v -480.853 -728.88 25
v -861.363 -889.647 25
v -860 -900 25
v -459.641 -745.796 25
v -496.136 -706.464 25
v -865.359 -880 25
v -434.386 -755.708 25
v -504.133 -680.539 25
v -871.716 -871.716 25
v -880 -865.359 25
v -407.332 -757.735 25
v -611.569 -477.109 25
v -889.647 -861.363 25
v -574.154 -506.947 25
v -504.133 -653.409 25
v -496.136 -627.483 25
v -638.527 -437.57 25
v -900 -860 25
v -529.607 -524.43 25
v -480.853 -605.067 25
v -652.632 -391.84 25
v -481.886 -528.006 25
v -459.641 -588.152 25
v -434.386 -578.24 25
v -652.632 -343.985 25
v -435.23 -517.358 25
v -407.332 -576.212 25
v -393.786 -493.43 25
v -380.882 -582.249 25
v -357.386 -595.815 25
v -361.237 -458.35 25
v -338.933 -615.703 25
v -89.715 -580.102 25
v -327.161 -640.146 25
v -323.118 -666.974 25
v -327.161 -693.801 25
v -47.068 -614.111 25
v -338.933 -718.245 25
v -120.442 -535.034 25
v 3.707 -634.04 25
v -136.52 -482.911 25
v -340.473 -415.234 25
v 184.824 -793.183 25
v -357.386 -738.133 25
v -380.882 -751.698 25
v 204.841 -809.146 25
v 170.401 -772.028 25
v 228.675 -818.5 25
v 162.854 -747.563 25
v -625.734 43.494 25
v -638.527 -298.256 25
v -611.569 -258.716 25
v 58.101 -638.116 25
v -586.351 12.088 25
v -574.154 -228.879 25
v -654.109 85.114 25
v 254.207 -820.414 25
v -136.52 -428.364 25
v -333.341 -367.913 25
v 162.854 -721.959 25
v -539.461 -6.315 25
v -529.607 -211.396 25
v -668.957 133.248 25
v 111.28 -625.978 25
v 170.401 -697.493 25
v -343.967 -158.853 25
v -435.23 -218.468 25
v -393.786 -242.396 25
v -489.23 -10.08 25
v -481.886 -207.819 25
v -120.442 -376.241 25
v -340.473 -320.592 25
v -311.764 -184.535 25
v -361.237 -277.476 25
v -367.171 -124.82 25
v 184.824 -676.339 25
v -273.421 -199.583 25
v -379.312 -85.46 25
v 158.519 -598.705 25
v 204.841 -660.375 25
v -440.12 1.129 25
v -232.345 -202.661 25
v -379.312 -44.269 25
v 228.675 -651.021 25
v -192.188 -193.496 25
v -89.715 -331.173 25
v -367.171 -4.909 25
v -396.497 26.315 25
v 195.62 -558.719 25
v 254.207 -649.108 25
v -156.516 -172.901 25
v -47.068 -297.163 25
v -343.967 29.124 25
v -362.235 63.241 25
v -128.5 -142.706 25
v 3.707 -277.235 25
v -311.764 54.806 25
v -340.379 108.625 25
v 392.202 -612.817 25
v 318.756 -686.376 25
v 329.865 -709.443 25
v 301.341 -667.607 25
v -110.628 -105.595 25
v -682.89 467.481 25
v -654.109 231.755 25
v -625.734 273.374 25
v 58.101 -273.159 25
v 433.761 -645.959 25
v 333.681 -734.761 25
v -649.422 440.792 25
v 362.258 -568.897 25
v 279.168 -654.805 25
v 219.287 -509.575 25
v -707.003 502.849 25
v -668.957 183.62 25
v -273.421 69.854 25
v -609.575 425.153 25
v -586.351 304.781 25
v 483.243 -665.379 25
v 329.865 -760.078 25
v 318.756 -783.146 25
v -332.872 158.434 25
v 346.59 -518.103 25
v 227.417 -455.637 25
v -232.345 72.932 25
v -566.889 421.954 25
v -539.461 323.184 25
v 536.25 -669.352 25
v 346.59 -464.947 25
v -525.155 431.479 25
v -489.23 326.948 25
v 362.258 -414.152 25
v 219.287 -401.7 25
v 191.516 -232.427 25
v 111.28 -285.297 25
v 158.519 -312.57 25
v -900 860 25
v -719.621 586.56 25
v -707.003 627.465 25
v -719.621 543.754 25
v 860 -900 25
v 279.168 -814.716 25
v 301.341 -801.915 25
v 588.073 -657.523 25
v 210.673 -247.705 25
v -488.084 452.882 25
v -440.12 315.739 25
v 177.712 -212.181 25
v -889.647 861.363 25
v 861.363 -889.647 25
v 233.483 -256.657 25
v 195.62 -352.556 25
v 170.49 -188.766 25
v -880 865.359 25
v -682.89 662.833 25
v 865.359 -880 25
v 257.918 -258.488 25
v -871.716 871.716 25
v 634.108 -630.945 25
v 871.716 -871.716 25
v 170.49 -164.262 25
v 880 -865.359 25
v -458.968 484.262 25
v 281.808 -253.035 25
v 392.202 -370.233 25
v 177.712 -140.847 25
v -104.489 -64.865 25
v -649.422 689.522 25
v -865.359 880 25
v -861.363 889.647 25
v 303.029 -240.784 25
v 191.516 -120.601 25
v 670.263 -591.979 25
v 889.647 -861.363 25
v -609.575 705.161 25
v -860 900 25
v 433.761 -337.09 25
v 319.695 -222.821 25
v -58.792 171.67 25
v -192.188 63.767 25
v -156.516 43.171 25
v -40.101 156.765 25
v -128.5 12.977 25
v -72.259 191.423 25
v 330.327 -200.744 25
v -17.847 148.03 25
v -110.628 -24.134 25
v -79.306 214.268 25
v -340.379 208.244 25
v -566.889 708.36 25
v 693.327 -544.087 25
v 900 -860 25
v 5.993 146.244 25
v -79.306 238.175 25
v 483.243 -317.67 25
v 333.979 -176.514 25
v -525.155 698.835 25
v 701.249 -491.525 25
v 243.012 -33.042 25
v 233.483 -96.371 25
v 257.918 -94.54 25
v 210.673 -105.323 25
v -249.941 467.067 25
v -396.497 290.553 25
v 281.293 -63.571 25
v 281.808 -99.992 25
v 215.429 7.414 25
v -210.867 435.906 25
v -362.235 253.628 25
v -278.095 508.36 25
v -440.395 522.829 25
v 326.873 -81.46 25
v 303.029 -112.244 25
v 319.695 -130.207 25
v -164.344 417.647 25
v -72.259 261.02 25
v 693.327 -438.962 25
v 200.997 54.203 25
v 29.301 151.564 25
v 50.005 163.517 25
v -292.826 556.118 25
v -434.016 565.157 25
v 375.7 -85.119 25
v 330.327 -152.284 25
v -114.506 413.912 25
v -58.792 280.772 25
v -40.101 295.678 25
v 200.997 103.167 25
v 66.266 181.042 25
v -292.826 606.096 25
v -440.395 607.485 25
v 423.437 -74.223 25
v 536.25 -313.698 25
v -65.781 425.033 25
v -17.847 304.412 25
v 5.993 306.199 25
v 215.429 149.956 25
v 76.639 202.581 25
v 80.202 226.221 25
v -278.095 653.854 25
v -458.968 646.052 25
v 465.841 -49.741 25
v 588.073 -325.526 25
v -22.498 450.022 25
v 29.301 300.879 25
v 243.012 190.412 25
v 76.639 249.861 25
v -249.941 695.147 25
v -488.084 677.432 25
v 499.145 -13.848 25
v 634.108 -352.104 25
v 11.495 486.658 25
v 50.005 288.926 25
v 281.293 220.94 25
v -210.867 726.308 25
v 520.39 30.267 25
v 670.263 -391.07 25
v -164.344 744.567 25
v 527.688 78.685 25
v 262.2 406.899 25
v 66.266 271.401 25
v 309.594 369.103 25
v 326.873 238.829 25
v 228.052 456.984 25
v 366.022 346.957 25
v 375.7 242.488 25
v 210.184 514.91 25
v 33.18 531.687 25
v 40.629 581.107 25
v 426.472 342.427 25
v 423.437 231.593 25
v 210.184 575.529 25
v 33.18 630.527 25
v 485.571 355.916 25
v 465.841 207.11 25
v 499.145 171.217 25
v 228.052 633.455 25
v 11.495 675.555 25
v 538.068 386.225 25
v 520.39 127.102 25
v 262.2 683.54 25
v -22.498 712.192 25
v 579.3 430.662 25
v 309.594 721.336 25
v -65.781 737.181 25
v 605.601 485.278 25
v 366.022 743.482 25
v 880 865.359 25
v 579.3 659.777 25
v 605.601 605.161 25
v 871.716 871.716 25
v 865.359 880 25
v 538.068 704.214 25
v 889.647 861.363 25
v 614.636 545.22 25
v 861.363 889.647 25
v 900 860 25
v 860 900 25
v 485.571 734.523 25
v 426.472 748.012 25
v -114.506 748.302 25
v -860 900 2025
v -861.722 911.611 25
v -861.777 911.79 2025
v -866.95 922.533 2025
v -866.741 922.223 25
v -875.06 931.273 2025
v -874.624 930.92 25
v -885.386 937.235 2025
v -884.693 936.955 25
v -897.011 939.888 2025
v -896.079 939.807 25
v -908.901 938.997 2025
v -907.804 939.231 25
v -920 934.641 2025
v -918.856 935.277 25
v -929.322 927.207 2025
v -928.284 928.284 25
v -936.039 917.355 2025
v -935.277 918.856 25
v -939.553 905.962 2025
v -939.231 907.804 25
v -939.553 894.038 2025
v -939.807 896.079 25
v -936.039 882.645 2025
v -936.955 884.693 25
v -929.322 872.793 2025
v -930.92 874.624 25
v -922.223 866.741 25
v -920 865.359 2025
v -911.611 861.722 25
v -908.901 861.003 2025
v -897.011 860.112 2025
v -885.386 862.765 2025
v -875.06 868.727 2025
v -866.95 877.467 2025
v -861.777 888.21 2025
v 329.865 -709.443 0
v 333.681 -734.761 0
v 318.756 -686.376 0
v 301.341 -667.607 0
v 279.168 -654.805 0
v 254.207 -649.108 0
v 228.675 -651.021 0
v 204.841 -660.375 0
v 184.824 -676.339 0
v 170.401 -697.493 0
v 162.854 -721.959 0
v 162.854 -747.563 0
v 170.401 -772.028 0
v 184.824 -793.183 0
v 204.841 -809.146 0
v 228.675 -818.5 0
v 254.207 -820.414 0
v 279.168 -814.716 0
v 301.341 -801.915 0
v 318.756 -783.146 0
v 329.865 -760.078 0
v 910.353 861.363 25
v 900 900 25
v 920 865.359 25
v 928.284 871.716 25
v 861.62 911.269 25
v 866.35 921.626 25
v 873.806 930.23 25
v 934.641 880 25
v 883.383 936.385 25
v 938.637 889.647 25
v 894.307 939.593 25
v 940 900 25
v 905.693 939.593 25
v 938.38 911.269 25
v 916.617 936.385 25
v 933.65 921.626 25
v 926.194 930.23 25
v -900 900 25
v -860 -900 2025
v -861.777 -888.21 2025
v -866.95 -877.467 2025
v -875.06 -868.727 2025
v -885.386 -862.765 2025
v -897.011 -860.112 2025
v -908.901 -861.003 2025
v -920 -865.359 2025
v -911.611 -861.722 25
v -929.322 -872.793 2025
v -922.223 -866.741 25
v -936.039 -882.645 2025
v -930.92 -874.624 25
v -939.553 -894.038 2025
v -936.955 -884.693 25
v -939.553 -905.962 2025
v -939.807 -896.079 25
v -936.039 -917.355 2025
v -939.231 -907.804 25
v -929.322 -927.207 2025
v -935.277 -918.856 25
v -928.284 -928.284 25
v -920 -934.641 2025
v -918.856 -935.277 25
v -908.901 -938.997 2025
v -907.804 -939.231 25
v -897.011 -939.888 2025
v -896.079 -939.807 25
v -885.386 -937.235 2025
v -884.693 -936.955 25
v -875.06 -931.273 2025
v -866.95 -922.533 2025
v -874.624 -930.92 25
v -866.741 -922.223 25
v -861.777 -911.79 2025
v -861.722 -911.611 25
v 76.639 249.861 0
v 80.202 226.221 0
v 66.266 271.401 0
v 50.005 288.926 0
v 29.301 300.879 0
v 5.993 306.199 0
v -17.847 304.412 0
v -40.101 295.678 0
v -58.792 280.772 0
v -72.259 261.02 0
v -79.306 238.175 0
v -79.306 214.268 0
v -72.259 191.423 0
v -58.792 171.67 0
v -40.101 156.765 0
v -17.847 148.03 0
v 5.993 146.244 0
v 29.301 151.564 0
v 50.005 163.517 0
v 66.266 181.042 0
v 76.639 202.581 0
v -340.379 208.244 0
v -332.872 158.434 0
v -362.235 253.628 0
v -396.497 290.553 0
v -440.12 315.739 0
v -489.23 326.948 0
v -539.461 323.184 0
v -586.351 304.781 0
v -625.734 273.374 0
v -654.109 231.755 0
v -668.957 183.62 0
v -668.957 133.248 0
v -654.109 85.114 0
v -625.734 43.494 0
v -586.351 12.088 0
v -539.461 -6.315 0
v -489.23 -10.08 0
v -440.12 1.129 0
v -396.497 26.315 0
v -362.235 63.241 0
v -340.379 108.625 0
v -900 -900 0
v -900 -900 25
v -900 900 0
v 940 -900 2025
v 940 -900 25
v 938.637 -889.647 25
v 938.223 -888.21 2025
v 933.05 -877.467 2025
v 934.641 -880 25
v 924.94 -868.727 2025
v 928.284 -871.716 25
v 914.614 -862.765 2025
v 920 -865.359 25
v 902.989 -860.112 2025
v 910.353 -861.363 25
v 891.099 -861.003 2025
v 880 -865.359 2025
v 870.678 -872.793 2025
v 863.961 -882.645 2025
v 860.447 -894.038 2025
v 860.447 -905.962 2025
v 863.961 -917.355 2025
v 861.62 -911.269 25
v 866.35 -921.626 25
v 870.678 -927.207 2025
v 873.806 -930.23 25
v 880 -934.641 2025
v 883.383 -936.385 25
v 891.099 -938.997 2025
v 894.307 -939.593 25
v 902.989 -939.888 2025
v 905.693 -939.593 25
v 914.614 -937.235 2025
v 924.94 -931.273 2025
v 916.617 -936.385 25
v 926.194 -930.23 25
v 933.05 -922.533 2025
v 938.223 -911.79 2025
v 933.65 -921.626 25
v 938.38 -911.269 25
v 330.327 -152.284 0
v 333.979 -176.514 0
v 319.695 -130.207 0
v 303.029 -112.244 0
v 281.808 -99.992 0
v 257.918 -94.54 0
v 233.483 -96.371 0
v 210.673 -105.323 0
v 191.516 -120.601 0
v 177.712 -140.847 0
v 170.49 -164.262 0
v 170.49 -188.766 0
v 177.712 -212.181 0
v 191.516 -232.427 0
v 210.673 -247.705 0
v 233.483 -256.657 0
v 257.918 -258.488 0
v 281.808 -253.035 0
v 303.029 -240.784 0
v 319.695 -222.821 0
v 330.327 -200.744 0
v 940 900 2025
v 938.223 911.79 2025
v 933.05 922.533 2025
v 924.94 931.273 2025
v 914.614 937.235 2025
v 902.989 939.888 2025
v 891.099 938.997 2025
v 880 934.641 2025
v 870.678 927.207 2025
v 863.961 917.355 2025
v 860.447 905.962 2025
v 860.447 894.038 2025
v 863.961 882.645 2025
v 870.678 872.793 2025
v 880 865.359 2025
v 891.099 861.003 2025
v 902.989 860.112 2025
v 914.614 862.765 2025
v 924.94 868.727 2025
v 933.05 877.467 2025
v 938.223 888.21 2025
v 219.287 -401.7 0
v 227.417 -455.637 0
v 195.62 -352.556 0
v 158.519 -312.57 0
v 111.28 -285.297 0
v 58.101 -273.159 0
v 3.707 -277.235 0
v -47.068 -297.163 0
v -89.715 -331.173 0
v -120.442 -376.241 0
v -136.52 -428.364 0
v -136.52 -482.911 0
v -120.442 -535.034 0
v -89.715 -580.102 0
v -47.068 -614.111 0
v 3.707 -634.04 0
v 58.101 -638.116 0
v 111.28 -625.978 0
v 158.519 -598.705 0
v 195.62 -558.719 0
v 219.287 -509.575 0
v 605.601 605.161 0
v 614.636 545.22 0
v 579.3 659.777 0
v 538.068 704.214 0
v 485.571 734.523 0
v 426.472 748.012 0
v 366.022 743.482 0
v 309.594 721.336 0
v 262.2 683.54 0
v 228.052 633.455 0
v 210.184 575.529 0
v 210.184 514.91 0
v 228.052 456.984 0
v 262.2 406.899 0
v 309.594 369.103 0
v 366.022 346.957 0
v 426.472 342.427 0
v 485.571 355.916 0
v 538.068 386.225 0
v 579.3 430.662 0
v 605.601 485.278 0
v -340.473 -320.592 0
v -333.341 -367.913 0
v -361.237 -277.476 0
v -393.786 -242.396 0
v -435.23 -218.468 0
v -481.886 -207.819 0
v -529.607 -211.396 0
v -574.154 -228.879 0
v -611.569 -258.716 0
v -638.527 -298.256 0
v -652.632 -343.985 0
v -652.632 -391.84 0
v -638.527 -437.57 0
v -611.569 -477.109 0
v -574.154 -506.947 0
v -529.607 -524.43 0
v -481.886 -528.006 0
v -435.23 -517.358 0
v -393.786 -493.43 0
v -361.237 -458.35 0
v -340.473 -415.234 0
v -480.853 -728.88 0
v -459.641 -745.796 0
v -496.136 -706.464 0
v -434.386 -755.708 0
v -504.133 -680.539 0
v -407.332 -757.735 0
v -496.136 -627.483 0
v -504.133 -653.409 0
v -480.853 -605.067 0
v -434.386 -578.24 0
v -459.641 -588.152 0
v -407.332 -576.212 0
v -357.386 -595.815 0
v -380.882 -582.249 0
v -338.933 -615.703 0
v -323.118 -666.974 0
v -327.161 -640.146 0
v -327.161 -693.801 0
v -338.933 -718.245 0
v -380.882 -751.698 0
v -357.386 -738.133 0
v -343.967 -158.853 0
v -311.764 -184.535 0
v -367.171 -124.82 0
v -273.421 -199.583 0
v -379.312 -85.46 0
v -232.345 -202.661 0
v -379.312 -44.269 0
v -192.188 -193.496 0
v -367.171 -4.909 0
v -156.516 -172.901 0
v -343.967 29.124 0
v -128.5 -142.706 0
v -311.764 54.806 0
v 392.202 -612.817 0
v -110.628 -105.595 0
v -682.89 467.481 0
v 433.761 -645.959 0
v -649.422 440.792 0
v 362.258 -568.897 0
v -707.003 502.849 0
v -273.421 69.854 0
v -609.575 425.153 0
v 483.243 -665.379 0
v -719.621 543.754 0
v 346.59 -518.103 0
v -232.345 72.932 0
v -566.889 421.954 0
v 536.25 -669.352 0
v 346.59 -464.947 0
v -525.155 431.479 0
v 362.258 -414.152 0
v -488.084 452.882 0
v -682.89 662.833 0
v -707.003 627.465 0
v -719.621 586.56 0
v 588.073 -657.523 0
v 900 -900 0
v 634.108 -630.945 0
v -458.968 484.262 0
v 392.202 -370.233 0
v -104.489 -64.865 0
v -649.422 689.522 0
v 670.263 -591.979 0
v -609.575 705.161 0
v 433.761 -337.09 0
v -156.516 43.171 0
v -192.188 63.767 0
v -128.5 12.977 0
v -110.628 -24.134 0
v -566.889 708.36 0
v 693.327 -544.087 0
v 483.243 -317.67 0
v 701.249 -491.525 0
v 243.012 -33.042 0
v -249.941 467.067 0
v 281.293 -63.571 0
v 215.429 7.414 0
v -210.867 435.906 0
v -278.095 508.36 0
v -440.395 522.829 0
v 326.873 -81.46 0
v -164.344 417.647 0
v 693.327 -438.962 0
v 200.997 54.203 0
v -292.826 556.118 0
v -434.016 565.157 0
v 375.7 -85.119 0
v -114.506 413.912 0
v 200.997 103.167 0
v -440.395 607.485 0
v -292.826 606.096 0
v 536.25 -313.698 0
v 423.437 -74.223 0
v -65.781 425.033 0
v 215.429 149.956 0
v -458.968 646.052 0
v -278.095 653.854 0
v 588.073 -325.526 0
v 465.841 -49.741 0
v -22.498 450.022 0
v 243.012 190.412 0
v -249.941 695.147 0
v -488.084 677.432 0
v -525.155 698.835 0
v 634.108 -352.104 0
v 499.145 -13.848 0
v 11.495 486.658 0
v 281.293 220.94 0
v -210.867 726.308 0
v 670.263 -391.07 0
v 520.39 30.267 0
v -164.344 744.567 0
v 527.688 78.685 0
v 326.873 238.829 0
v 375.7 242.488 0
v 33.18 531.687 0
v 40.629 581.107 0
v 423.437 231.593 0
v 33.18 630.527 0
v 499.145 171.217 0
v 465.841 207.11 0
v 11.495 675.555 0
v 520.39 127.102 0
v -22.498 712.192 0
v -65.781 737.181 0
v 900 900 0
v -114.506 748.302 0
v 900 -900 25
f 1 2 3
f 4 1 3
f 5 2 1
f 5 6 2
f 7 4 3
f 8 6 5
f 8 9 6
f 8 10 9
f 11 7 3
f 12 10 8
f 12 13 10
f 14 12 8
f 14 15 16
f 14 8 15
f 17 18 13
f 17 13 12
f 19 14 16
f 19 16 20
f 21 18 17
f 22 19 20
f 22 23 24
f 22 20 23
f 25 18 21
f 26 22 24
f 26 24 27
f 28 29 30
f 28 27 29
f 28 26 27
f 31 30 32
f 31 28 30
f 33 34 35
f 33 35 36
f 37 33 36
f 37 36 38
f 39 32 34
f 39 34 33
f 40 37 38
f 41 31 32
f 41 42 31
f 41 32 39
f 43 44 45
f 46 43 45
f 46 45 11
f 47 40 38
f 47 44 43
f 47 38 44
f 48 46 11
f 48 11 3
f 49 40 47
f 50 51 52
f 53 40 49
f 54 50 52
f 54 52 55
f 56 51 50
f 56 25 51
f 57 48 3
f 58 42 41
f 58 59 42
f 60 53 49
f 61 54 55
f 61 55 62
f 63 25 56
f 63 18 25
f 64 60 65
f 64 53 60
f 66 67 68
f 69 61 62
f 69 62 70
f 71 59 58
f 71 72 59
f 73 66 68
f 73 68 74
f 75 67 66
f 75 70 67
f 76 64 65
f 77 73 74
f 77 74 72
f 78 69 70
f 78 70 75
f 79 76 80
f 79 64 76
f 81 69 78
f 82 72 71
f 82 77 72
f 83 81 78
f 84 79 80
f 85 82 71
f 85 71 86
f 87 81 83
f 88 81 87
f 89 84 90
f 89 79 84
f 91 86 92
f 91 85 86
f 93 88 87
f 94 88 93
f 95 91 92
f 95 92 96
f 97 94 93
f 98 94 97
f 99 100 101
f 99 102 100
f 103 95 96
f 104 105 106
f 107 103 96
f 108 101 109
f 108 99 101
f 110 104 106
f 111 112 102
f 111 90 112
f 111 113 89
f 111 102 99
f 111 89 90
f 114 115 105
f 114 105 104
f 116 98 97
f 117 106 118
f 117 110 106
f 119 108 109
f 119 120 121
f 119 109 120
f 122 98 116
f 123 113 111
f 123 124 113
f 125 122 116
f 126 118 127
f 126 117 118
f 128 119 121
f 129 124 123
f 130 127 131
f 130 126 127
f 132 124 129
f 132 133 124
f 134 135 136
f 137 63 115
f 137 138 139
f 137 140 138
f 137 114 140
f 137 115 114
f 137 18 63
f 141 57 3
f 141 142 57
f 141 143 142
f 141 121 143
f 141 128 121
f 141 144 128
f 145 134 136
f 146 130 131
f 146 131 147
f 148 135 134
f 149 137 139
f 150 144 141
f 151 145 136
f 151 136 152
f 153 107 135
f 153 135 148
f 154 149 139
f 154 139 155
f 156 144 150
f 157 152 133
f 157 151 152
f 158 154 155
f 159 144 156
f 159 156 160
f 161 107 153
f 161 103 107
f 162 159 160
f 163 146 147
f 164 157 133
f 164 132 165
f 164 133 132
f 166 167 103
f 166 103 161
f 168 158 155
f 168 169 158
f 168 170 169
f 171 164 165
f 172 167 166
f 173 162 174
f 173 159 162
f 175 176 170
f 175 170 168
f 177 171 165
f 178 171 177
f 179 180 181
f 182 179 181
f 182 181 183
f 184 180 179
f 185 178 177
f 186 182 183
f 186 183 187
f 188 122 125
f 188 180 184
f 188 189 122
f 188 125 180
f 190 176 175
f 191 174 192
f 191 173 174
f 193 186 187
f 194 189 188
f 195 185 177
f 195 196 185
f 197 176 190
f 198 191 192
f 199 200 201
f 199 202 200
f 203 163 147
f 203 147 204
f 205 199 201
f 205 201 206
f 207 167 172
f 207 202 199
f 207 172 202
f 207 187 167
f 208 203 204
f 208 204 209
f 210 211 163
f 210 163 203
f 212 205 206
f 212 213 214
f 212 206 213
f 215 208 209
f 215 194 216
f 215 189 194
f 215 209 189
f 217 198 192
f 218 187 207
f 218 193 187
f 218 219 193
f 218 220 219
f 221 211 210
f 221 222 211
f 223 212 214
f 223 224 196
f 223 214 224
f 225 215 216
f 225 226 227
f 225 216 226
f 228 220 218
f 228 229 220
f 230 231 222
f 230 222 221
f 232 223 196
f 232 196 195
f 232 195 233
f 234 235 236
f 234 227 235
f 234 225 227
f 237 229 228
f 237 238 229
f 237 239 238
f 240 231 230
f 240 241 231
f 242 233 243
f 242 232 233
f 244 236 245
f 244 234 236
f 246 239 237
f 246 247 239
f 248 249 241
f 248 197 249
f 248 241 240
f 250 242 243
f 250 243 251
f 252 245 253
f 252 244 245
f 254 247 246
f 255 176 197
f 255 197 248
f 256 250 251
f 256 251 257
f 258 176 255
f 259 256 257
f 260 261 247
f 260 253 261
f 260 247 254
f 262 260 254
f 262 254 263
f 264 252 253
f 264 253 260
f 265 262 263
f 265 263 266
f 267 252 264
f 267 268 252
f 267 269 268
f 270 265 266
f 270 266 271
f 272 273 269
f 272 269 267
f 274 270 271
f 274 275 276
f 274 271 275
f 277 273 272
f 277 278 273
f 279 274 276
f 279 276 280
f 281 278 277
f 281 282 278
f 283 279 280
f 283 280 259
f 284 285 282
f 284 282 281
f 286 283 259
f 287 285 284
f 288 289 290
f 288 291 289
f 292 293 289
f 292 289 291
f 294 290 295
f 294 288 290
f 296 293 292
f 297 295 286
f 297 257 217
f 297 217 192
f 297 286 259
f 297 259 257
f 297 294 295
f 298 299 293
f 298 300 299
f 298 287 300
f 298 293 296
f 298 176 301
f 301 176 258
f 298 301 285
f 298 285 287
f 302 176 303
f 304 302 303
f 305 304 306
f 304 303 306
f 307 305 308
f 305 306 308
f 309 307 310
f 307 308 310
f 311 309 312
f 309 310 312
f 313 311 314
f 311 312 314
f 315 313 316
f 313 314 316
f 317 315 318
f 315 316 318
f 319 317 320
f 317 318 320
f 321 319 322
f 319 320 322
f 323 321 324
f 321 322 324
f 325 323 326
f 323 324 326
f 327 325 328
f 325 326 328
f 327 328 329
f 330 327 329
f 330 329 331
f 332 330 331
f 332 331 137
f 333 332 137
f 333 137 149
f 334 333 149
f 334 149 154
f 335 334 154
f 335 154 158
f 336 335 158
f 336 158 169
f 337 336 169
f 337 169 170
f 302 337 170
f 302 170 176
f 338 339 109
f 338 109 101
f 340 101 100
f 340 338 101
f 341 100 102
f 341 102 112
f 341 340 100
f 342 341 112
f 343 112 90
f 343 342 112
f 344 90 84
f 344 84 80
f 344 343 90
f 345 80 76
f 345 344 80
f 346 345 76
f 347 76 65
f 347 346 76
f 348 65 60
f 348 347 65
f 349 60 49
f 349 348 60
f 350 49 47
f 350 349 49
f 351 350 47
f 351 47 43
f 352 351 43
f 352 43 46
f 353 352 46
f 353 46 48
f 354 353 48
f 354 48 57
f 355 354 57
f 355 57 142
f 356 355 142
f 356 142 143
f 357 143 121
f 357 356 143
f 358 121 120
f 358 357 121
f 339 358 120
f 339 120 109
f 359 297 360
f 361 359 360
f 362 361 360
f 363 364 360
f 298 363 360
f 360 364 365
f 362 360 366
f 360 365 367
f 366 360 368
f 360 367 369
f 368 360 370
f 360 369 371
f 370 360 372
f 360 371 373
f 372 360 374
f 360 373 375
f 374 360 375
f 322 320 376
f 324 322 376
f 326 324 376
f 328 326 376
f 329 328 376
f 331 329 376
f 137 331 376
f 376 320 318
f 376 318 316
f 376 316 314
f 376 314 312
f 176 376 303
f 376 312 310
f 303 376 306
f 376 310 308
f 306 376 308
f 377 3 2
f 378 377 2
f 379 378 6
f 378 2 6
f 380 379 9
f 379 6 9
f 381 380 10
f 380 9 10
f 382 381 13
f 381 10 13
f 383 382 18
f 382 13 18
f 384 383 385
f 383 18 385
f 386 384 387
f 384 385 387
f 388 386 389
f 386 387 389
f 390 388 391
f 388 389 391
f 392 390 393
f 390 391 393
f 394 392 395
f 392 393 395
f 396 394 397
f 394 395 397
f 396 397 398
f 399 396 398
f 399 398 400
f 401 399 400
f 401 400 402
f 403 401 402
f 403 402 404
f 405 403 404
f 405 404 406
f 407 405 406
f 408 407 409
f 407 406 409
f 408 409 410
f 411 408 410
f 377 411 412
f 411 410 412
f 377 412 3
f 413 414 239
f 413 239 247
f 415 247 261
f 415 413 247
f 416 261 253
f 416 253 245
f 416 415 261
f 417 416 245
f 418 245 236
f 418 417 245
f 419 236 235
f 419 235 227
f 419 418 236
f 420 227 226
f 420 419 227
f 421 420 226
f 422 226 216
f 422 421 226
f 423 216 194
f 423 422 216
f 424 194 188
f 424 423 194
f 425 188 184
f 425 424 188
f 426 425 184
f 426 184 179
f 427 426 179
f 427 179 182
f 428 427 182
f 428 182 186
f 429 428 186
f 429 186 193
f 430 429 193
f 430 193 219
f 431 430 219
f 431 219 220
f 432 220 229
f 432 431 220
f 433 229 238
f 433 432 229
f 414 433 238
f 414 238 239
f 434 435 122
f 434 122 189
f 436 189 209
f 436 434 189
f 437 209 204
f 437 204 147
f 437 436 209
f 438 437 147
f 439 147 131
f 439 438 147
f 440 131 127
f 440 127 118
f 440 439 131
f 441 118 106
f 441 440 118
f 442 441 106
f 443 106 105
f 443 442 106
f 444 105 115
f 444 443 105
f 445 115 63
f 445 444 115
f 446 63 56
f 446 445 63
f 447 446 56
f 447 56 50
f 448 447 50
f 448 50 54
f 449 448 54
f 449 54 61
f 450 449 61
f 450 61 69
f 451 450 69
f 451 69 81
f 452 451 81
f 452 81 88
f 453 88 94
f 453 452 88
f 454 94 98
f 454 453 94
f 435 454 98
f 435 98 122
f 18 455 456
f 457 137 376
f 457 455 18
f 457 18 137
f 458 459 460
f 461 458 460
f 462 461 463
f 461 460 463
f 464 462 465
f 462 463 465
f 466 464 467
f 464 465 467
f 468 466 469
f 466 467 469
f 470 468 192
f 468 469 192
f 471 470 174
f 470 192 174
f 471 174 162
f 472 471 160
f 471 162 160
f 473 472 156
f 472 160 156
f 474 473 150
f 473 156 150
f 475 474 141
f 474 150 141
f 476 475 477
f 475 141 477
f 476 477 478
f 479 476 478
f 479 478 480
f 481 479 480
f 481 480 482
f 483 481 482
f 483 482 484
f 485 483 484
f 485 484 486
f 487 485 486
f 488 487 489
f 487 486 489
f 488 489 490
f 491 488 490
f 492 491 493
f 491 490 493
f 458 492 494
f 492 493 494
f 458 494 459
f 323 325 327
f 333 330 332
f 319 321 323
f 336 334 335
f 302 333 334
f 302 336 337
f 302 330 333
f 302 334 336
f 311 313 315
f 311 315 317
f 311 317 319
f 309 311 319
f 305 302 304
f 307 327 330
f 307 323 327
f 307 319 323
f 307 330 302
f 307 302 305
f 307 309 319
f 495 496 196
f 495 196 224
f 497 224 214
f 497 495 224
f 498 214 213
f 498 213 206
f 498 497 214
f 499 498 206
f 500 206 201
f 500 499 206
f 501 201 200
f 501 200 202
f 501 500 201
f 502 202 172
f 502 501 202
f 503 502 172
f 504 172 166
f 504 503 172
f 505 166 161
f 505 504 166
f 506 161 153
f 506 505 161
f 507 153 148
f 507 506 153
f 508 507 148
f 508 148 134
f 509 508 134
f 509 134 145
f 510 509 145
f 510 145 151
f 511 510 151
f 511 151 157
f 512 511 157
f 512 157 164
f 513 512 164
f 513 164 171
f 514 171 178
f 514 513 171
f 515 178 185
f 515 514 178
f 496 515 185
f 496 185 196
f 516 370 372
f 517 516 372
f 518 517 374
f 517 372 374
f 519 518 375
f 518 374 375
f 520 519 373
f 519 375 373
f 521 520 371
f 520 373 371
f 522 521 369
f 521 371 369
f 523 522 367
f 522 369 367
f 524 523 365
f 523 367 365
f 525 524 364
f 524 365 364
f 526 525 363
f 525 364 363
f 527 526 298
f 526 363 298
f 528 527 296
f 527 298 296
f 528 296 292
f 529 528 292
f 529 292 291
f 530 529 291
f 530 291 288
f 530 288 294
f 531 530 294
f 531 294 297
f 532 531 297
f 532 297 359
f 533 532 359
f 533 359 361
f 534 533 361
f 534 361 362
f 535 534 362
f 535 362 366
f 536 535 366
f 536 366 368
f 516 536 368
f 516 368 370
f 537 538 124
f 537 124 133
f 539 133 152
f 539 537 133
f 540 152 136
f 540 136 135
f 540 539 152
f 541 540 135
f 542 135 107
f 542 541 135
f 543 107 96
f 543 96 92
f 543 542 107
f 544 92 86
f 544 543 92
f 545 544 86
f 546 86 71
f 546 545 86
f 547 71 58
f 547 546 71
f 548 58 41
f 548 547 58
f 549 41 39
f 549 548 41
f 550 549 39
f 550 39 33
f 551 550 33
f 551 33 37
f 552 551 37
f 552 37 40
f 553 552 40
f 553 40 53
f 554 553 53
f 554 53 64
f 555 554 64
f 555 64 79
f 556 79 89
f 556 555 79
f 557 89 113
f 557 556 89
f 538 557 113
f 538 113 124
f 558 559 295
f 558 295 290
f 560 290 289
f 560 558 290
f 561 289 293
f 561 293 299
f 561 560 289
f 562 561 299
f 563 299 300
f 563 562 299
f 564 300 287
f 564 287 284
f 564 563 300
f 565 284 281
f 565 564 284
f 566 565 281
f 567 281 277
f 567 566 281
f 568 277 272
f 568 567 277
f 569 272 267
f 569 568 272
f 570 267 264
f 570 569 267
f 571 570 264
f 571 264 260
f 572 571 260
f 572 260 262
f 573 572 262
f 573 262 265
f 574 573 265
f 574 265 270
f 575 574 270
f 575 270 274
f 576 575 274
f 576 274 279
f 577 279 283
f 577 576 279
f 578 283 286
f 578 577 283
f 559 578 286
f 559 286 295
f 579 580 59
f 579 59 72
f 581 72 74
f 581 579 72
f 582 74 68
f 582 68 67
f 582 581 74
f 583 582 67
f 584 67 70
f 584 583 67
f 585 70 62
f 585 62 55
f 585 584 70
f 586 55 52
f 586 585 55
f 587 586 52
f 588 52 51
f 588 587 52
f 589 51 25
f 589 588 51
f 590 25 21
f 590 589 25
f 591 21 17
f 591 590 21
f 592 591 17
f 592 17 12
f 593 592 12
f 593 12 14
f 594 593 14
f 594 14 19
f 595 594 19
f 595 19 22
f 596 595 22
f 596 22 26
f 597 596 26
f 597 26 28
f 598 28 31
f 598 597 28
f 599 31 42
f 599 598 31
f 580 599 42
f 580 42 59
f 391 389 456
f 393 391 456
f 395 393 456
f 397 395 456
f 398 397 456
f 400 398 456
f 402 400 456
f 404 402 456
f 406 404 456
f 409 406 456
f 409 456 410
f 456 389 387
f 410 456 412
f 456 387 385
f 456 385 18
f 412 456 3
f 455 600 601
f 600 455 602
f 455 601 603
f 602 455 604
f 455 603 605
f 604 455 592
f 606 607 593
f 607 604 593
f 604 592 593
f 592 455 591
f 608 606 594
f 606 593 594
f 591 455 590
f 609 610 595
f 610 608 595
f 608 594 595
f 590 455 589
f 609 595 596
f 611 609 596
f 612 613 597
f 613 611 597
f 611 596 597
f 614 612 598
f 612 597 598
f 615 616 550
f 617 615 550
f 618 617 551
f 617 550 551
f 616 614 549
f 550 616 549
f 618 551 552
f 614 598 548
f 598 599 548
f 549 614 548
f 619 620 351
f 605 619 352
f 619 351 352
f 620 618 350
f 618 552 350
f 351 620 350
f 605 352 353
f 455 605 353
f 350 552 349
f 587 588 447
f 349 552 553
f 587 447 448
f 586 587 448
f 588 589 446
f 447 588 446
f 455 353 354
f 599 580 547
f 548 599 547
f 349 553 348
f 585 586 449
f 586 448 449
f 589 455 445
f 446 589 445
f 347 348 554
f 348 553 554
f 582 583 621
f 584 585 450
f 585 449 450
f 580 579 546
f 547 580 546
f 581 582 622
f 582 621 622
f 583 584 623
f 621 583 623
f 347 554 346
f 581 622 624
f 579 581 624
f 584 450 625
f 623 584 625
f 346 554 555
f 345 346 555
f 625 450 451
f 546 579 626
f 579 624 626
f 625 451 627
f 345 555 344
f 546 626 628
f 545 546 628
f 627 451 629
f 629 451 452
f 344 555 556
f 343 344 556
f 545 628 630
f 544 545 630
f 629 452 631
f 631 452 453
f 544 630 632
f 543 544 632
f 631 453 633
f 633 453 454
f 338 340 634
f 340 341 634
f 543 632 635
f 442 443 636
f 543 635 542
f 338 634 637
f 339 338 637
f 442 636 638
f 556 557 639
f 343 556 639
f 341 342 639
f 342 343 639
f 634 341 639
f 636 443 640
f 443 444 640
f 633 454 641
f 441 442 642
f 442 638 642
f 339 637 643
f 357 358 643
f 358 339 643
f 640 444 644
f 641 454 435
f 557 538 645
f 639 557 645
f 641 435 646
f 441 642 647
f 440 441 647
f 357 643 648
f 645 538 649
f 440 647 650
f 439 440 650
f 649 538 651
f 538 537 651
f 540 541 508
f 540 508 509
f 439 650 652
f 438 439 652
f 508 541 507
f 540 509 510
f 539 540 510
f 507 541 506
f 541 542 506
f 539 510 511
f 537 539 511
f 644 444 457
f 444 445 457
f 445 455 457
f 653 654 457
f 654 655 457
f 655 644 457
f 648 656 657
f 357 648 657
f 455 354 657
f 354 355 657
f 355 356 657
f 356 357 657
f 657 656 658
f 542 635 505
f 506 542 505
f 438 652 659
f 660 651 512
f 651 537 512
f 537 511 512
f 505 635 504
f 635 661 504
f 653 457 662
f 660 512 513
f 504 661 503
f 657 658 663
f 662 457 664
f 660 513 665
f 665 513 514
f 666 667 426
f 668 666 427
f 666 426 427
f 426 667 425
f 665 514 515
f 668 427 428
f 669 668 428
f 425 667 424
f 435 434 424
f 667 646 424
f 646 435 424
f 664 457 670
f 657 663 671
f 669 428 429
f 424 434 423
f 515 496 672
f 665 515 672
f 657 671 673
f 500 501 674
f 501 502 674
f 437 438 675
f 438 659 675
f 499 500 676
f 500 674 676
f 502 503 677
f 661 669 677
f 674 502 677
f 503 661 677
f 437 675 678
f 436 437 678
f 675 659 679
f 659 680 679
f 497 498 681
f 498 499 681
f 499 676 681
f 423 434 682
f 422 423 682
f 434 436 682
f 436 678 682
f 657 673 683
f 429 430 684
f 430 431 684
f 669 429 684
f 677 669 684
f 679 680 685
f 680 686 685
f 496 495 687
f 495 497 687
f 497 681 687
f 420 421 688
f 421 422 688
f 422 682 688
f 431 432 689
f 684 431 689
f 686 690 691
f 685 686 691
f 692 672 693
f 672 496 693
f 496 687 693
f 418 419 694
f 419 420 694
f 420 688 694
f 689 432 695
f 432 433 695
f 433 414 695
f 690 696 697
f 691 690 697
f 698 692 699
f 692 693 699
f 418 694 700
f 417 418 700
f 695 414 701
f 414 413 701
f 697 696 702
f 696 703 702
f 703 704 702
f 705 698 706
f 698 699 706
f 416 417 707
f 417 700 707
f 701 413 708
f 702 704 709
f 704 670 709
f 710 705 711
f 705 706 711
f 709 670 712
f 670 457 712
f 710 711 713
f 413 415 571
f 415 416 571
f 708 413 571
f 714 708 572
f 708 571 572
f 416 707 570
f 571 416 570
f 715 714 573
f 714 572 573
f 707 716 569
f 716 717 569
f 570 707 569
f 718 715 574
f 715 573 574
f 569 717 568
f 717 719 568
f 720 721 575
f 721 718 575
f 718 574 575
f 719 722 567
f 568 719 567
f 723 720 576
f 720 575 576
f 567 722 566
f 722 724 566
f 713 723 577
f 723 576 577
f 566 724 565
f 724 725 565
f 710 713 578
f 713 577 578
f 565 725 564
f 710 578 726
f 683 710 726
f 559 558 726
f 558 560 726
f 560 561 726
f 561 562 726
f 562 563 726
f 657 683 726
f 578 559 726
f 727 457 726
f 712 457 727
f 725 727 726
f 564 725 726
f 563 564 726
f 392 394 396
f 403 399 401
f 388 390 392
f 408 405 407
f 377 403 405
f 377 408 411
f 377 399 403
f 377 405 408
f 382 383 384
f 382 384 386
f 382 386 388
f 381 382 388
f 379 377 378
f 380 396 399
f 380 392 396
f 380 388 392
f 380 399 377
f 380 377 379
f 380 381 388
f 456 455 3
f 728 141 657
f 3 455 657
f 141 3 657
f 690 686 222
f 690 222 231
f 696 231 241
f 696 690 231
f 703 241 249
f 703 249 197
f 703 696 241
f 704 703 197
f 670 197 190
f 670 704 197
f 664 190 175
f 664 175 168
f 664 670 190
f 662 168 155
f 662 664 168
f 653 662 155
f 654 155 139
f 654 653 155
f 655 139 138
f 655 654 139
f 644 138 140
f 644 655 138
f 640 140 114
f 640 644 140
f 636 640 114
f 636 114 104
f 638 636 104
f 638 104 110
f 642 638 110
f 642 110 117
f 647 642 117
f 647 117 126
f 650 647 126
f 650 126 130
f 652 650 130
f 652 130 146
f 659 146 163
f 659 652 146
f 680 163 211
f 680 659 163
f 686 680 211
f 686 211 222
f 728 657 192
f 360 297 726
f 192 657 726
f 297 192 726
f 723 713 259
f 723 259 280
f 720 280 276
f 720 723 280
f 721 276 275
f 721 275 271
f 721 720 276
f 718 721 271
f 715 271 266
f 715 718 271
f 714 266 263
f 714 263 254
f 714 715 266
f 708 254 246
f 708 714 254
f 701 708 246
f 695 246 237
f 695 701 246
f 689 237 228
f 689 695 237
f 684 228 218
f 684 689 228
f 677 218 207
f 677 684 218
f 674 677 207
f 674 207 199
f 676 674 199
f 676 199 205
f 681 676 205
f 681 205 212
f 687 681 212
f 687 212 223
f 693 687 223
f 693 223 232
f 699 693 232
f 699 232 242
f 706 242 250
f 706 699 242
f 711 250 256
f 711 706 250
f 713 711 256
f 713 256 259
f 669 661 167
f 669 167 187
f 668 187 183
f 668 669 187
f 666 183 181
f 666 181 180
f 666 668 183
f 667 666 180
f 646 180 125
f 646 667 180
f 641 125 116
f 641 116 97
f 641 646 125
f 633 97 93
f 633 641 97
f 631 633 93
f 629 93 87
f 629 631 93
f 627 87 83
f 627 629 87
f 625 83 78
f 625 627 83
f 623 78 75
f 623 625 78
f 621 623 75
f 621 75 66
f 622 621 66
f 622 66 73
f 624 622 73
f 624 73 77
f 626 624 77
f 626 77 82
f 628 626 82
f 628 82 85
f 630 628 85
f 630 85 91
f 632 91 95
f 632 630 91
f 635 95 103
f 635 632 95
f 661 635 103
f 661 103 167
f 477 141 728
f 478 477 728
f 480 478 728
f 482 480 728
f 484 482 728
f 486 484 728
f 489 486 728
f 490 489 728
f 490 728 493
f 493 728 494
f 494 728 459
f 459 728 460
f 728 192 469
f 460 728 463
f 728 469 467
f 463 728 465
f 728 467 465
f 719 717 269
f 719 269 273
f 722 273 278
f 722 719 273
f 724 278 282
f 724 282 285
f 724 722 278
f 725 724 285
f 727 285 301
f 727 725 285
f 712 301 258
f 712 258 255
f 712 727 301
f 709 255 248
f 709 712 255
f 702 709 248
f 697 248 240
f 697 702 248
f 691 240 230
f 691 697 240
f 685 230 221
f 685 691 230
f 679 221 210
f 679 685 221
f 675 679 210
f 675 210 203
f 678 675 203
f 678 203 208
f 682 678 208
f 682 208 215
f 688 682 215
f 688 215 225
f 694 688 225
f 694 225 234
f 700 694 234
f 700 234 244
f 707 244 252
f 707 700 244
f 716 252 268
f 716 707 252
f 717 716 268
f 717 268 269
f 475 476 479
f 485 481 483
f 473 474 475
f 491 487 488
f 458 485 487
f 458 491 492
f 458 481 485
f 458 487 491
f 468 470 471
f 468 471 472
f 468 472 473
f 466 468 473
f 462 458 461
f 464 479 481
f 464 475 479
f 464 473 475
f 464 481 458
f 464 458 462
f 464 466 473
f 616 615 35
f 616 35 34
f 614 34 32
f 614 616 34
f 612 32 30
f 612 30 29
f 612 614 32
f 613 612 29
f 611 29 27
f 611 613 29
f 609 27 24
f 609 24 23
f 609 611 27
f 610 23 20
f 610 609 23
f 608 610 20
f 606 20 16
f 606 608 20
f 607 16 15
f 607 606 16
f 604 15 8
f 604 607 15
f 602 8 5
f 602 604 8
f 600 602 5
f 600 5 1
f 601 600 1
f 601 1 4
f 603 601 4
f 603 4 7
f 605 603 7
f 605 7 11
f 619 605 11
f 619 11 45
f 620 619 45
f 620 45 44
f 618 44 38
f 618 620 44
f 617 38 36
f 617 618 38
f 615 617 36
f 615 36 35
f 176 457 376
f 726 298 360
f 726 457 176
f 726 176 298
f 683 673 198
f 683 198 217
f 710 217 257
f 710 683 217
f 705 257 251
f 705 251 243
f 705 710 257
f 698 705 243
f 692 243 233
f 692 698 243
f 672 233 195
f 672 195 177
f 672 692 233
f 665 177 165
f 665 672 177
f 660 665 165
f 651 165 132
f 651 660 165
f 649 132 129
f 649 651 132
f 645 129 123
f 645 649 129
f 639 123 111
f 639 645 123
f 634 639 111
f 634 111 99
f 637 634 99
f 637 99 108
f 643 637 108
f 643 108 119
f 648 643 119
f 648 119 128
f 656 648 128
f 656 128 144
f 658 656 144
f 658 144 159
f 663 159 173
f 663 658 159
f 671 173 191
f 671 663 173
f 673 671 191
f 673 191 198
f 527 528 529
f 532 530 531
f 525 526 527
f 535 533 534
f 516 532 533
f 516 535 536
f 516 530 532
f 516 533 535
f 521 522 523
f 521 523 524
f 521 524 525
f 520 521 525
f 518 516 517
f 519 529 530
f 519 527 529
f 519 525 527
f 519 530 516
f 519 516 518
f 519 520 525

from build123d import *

# Parameters (mm, degrees)
F0_W     = 1800
F0_H     = 1800
F0_R     = 91.015885
F0_R_2   = 160.542429
F0_R_3   = 138.183302
F0_R_4   = 85.892958
F0_R_5   = 182.990019
F0_R_6   = 178.325427
F0_R_7   = 82.203981
F0_R_8   = 168.986277
F0_R_9   = 143.604574
F0_R_10  = 167.663839
F0_R_11  = 164.262773
F0_R_12  = 80.201658
F0_R_13  = 203.361422
F1_DEPTH = 25
F2_R     = 40
F3_DEPTH = 2000


with BuildPart() as f1:
    # F0 (on Top) → F1 (new body)
    with BuildSketch(Plane.XY):
        Rectangle(F0_W, F0_H)
        with Locations((-414.133489, -666.97377)):
            Circle(F0_R, mode=Mode.SUBTRACT)
        with Locations((-493.883044, -367.912889)):
            Circle(F0_R_2, mode=Mode.SUBTRACT)
        with Locations((-242.671937, -64.864568)):
            Circle(F0_R_3, mode=Mode.SUBTRACT)
        with Locations((247.787848, -734.76088)):
            Circle(F0_R_4, mode=Mode.SUBTRACT)
        with Locations((44.426516, -455.637455)):
            Circle(F0_R_5, mode=Mode.SUBTRACT)
        with Locations((522.923887, -491.524756)):
            Circle(F0_R_6, mode=Mode.SUBTRACT)
        with Locations((251.775354, -176.513955)):
            Circle(F0_R_7, mode=Mode.SUBTRACT)
        with Locations((-501.857996, 158.434197)):
            Circle(F0_R_8, mode=Mode.SUBTRACT)
        with Locations((-577.620089, 565.156937)):
            Circle(F0_R_9, mode=Mode.SUBTRACT)
        with Locations((-127.035052, 581.106901)):
            Circle(F0_R_10, mode=Mode.SUBTRACT)
        with Locations((363.424748, 78.684643)):
            Circle(F0_R_11, mode=Mode.SUBTRACT)
        with Locations((0, 226.221323)):
            Circle(F0_R_12, mode=Mode.SUBTRACT)
        with Locations((411.274463, 545.219541)):
            Circle(F0_R_13, mode=Mode.SUBTRACT)
    extrude(amount=F1_DEPTH)

    # F2 (on face) → F3 (join)
    with BuildSketch(Plane.XY.offset(25)):
        with Locations((900, 900)):
            Circle(F2_R)
        with Locations((900, -900)):
            Circle(F2_R)
        with Locations((-900, 900)):
            Circle(F2_R)
        with Locations((-900, -900)):
            Circle(F2_R)
    extrude(amount=F3_DEPTH)


solid = f1.part
